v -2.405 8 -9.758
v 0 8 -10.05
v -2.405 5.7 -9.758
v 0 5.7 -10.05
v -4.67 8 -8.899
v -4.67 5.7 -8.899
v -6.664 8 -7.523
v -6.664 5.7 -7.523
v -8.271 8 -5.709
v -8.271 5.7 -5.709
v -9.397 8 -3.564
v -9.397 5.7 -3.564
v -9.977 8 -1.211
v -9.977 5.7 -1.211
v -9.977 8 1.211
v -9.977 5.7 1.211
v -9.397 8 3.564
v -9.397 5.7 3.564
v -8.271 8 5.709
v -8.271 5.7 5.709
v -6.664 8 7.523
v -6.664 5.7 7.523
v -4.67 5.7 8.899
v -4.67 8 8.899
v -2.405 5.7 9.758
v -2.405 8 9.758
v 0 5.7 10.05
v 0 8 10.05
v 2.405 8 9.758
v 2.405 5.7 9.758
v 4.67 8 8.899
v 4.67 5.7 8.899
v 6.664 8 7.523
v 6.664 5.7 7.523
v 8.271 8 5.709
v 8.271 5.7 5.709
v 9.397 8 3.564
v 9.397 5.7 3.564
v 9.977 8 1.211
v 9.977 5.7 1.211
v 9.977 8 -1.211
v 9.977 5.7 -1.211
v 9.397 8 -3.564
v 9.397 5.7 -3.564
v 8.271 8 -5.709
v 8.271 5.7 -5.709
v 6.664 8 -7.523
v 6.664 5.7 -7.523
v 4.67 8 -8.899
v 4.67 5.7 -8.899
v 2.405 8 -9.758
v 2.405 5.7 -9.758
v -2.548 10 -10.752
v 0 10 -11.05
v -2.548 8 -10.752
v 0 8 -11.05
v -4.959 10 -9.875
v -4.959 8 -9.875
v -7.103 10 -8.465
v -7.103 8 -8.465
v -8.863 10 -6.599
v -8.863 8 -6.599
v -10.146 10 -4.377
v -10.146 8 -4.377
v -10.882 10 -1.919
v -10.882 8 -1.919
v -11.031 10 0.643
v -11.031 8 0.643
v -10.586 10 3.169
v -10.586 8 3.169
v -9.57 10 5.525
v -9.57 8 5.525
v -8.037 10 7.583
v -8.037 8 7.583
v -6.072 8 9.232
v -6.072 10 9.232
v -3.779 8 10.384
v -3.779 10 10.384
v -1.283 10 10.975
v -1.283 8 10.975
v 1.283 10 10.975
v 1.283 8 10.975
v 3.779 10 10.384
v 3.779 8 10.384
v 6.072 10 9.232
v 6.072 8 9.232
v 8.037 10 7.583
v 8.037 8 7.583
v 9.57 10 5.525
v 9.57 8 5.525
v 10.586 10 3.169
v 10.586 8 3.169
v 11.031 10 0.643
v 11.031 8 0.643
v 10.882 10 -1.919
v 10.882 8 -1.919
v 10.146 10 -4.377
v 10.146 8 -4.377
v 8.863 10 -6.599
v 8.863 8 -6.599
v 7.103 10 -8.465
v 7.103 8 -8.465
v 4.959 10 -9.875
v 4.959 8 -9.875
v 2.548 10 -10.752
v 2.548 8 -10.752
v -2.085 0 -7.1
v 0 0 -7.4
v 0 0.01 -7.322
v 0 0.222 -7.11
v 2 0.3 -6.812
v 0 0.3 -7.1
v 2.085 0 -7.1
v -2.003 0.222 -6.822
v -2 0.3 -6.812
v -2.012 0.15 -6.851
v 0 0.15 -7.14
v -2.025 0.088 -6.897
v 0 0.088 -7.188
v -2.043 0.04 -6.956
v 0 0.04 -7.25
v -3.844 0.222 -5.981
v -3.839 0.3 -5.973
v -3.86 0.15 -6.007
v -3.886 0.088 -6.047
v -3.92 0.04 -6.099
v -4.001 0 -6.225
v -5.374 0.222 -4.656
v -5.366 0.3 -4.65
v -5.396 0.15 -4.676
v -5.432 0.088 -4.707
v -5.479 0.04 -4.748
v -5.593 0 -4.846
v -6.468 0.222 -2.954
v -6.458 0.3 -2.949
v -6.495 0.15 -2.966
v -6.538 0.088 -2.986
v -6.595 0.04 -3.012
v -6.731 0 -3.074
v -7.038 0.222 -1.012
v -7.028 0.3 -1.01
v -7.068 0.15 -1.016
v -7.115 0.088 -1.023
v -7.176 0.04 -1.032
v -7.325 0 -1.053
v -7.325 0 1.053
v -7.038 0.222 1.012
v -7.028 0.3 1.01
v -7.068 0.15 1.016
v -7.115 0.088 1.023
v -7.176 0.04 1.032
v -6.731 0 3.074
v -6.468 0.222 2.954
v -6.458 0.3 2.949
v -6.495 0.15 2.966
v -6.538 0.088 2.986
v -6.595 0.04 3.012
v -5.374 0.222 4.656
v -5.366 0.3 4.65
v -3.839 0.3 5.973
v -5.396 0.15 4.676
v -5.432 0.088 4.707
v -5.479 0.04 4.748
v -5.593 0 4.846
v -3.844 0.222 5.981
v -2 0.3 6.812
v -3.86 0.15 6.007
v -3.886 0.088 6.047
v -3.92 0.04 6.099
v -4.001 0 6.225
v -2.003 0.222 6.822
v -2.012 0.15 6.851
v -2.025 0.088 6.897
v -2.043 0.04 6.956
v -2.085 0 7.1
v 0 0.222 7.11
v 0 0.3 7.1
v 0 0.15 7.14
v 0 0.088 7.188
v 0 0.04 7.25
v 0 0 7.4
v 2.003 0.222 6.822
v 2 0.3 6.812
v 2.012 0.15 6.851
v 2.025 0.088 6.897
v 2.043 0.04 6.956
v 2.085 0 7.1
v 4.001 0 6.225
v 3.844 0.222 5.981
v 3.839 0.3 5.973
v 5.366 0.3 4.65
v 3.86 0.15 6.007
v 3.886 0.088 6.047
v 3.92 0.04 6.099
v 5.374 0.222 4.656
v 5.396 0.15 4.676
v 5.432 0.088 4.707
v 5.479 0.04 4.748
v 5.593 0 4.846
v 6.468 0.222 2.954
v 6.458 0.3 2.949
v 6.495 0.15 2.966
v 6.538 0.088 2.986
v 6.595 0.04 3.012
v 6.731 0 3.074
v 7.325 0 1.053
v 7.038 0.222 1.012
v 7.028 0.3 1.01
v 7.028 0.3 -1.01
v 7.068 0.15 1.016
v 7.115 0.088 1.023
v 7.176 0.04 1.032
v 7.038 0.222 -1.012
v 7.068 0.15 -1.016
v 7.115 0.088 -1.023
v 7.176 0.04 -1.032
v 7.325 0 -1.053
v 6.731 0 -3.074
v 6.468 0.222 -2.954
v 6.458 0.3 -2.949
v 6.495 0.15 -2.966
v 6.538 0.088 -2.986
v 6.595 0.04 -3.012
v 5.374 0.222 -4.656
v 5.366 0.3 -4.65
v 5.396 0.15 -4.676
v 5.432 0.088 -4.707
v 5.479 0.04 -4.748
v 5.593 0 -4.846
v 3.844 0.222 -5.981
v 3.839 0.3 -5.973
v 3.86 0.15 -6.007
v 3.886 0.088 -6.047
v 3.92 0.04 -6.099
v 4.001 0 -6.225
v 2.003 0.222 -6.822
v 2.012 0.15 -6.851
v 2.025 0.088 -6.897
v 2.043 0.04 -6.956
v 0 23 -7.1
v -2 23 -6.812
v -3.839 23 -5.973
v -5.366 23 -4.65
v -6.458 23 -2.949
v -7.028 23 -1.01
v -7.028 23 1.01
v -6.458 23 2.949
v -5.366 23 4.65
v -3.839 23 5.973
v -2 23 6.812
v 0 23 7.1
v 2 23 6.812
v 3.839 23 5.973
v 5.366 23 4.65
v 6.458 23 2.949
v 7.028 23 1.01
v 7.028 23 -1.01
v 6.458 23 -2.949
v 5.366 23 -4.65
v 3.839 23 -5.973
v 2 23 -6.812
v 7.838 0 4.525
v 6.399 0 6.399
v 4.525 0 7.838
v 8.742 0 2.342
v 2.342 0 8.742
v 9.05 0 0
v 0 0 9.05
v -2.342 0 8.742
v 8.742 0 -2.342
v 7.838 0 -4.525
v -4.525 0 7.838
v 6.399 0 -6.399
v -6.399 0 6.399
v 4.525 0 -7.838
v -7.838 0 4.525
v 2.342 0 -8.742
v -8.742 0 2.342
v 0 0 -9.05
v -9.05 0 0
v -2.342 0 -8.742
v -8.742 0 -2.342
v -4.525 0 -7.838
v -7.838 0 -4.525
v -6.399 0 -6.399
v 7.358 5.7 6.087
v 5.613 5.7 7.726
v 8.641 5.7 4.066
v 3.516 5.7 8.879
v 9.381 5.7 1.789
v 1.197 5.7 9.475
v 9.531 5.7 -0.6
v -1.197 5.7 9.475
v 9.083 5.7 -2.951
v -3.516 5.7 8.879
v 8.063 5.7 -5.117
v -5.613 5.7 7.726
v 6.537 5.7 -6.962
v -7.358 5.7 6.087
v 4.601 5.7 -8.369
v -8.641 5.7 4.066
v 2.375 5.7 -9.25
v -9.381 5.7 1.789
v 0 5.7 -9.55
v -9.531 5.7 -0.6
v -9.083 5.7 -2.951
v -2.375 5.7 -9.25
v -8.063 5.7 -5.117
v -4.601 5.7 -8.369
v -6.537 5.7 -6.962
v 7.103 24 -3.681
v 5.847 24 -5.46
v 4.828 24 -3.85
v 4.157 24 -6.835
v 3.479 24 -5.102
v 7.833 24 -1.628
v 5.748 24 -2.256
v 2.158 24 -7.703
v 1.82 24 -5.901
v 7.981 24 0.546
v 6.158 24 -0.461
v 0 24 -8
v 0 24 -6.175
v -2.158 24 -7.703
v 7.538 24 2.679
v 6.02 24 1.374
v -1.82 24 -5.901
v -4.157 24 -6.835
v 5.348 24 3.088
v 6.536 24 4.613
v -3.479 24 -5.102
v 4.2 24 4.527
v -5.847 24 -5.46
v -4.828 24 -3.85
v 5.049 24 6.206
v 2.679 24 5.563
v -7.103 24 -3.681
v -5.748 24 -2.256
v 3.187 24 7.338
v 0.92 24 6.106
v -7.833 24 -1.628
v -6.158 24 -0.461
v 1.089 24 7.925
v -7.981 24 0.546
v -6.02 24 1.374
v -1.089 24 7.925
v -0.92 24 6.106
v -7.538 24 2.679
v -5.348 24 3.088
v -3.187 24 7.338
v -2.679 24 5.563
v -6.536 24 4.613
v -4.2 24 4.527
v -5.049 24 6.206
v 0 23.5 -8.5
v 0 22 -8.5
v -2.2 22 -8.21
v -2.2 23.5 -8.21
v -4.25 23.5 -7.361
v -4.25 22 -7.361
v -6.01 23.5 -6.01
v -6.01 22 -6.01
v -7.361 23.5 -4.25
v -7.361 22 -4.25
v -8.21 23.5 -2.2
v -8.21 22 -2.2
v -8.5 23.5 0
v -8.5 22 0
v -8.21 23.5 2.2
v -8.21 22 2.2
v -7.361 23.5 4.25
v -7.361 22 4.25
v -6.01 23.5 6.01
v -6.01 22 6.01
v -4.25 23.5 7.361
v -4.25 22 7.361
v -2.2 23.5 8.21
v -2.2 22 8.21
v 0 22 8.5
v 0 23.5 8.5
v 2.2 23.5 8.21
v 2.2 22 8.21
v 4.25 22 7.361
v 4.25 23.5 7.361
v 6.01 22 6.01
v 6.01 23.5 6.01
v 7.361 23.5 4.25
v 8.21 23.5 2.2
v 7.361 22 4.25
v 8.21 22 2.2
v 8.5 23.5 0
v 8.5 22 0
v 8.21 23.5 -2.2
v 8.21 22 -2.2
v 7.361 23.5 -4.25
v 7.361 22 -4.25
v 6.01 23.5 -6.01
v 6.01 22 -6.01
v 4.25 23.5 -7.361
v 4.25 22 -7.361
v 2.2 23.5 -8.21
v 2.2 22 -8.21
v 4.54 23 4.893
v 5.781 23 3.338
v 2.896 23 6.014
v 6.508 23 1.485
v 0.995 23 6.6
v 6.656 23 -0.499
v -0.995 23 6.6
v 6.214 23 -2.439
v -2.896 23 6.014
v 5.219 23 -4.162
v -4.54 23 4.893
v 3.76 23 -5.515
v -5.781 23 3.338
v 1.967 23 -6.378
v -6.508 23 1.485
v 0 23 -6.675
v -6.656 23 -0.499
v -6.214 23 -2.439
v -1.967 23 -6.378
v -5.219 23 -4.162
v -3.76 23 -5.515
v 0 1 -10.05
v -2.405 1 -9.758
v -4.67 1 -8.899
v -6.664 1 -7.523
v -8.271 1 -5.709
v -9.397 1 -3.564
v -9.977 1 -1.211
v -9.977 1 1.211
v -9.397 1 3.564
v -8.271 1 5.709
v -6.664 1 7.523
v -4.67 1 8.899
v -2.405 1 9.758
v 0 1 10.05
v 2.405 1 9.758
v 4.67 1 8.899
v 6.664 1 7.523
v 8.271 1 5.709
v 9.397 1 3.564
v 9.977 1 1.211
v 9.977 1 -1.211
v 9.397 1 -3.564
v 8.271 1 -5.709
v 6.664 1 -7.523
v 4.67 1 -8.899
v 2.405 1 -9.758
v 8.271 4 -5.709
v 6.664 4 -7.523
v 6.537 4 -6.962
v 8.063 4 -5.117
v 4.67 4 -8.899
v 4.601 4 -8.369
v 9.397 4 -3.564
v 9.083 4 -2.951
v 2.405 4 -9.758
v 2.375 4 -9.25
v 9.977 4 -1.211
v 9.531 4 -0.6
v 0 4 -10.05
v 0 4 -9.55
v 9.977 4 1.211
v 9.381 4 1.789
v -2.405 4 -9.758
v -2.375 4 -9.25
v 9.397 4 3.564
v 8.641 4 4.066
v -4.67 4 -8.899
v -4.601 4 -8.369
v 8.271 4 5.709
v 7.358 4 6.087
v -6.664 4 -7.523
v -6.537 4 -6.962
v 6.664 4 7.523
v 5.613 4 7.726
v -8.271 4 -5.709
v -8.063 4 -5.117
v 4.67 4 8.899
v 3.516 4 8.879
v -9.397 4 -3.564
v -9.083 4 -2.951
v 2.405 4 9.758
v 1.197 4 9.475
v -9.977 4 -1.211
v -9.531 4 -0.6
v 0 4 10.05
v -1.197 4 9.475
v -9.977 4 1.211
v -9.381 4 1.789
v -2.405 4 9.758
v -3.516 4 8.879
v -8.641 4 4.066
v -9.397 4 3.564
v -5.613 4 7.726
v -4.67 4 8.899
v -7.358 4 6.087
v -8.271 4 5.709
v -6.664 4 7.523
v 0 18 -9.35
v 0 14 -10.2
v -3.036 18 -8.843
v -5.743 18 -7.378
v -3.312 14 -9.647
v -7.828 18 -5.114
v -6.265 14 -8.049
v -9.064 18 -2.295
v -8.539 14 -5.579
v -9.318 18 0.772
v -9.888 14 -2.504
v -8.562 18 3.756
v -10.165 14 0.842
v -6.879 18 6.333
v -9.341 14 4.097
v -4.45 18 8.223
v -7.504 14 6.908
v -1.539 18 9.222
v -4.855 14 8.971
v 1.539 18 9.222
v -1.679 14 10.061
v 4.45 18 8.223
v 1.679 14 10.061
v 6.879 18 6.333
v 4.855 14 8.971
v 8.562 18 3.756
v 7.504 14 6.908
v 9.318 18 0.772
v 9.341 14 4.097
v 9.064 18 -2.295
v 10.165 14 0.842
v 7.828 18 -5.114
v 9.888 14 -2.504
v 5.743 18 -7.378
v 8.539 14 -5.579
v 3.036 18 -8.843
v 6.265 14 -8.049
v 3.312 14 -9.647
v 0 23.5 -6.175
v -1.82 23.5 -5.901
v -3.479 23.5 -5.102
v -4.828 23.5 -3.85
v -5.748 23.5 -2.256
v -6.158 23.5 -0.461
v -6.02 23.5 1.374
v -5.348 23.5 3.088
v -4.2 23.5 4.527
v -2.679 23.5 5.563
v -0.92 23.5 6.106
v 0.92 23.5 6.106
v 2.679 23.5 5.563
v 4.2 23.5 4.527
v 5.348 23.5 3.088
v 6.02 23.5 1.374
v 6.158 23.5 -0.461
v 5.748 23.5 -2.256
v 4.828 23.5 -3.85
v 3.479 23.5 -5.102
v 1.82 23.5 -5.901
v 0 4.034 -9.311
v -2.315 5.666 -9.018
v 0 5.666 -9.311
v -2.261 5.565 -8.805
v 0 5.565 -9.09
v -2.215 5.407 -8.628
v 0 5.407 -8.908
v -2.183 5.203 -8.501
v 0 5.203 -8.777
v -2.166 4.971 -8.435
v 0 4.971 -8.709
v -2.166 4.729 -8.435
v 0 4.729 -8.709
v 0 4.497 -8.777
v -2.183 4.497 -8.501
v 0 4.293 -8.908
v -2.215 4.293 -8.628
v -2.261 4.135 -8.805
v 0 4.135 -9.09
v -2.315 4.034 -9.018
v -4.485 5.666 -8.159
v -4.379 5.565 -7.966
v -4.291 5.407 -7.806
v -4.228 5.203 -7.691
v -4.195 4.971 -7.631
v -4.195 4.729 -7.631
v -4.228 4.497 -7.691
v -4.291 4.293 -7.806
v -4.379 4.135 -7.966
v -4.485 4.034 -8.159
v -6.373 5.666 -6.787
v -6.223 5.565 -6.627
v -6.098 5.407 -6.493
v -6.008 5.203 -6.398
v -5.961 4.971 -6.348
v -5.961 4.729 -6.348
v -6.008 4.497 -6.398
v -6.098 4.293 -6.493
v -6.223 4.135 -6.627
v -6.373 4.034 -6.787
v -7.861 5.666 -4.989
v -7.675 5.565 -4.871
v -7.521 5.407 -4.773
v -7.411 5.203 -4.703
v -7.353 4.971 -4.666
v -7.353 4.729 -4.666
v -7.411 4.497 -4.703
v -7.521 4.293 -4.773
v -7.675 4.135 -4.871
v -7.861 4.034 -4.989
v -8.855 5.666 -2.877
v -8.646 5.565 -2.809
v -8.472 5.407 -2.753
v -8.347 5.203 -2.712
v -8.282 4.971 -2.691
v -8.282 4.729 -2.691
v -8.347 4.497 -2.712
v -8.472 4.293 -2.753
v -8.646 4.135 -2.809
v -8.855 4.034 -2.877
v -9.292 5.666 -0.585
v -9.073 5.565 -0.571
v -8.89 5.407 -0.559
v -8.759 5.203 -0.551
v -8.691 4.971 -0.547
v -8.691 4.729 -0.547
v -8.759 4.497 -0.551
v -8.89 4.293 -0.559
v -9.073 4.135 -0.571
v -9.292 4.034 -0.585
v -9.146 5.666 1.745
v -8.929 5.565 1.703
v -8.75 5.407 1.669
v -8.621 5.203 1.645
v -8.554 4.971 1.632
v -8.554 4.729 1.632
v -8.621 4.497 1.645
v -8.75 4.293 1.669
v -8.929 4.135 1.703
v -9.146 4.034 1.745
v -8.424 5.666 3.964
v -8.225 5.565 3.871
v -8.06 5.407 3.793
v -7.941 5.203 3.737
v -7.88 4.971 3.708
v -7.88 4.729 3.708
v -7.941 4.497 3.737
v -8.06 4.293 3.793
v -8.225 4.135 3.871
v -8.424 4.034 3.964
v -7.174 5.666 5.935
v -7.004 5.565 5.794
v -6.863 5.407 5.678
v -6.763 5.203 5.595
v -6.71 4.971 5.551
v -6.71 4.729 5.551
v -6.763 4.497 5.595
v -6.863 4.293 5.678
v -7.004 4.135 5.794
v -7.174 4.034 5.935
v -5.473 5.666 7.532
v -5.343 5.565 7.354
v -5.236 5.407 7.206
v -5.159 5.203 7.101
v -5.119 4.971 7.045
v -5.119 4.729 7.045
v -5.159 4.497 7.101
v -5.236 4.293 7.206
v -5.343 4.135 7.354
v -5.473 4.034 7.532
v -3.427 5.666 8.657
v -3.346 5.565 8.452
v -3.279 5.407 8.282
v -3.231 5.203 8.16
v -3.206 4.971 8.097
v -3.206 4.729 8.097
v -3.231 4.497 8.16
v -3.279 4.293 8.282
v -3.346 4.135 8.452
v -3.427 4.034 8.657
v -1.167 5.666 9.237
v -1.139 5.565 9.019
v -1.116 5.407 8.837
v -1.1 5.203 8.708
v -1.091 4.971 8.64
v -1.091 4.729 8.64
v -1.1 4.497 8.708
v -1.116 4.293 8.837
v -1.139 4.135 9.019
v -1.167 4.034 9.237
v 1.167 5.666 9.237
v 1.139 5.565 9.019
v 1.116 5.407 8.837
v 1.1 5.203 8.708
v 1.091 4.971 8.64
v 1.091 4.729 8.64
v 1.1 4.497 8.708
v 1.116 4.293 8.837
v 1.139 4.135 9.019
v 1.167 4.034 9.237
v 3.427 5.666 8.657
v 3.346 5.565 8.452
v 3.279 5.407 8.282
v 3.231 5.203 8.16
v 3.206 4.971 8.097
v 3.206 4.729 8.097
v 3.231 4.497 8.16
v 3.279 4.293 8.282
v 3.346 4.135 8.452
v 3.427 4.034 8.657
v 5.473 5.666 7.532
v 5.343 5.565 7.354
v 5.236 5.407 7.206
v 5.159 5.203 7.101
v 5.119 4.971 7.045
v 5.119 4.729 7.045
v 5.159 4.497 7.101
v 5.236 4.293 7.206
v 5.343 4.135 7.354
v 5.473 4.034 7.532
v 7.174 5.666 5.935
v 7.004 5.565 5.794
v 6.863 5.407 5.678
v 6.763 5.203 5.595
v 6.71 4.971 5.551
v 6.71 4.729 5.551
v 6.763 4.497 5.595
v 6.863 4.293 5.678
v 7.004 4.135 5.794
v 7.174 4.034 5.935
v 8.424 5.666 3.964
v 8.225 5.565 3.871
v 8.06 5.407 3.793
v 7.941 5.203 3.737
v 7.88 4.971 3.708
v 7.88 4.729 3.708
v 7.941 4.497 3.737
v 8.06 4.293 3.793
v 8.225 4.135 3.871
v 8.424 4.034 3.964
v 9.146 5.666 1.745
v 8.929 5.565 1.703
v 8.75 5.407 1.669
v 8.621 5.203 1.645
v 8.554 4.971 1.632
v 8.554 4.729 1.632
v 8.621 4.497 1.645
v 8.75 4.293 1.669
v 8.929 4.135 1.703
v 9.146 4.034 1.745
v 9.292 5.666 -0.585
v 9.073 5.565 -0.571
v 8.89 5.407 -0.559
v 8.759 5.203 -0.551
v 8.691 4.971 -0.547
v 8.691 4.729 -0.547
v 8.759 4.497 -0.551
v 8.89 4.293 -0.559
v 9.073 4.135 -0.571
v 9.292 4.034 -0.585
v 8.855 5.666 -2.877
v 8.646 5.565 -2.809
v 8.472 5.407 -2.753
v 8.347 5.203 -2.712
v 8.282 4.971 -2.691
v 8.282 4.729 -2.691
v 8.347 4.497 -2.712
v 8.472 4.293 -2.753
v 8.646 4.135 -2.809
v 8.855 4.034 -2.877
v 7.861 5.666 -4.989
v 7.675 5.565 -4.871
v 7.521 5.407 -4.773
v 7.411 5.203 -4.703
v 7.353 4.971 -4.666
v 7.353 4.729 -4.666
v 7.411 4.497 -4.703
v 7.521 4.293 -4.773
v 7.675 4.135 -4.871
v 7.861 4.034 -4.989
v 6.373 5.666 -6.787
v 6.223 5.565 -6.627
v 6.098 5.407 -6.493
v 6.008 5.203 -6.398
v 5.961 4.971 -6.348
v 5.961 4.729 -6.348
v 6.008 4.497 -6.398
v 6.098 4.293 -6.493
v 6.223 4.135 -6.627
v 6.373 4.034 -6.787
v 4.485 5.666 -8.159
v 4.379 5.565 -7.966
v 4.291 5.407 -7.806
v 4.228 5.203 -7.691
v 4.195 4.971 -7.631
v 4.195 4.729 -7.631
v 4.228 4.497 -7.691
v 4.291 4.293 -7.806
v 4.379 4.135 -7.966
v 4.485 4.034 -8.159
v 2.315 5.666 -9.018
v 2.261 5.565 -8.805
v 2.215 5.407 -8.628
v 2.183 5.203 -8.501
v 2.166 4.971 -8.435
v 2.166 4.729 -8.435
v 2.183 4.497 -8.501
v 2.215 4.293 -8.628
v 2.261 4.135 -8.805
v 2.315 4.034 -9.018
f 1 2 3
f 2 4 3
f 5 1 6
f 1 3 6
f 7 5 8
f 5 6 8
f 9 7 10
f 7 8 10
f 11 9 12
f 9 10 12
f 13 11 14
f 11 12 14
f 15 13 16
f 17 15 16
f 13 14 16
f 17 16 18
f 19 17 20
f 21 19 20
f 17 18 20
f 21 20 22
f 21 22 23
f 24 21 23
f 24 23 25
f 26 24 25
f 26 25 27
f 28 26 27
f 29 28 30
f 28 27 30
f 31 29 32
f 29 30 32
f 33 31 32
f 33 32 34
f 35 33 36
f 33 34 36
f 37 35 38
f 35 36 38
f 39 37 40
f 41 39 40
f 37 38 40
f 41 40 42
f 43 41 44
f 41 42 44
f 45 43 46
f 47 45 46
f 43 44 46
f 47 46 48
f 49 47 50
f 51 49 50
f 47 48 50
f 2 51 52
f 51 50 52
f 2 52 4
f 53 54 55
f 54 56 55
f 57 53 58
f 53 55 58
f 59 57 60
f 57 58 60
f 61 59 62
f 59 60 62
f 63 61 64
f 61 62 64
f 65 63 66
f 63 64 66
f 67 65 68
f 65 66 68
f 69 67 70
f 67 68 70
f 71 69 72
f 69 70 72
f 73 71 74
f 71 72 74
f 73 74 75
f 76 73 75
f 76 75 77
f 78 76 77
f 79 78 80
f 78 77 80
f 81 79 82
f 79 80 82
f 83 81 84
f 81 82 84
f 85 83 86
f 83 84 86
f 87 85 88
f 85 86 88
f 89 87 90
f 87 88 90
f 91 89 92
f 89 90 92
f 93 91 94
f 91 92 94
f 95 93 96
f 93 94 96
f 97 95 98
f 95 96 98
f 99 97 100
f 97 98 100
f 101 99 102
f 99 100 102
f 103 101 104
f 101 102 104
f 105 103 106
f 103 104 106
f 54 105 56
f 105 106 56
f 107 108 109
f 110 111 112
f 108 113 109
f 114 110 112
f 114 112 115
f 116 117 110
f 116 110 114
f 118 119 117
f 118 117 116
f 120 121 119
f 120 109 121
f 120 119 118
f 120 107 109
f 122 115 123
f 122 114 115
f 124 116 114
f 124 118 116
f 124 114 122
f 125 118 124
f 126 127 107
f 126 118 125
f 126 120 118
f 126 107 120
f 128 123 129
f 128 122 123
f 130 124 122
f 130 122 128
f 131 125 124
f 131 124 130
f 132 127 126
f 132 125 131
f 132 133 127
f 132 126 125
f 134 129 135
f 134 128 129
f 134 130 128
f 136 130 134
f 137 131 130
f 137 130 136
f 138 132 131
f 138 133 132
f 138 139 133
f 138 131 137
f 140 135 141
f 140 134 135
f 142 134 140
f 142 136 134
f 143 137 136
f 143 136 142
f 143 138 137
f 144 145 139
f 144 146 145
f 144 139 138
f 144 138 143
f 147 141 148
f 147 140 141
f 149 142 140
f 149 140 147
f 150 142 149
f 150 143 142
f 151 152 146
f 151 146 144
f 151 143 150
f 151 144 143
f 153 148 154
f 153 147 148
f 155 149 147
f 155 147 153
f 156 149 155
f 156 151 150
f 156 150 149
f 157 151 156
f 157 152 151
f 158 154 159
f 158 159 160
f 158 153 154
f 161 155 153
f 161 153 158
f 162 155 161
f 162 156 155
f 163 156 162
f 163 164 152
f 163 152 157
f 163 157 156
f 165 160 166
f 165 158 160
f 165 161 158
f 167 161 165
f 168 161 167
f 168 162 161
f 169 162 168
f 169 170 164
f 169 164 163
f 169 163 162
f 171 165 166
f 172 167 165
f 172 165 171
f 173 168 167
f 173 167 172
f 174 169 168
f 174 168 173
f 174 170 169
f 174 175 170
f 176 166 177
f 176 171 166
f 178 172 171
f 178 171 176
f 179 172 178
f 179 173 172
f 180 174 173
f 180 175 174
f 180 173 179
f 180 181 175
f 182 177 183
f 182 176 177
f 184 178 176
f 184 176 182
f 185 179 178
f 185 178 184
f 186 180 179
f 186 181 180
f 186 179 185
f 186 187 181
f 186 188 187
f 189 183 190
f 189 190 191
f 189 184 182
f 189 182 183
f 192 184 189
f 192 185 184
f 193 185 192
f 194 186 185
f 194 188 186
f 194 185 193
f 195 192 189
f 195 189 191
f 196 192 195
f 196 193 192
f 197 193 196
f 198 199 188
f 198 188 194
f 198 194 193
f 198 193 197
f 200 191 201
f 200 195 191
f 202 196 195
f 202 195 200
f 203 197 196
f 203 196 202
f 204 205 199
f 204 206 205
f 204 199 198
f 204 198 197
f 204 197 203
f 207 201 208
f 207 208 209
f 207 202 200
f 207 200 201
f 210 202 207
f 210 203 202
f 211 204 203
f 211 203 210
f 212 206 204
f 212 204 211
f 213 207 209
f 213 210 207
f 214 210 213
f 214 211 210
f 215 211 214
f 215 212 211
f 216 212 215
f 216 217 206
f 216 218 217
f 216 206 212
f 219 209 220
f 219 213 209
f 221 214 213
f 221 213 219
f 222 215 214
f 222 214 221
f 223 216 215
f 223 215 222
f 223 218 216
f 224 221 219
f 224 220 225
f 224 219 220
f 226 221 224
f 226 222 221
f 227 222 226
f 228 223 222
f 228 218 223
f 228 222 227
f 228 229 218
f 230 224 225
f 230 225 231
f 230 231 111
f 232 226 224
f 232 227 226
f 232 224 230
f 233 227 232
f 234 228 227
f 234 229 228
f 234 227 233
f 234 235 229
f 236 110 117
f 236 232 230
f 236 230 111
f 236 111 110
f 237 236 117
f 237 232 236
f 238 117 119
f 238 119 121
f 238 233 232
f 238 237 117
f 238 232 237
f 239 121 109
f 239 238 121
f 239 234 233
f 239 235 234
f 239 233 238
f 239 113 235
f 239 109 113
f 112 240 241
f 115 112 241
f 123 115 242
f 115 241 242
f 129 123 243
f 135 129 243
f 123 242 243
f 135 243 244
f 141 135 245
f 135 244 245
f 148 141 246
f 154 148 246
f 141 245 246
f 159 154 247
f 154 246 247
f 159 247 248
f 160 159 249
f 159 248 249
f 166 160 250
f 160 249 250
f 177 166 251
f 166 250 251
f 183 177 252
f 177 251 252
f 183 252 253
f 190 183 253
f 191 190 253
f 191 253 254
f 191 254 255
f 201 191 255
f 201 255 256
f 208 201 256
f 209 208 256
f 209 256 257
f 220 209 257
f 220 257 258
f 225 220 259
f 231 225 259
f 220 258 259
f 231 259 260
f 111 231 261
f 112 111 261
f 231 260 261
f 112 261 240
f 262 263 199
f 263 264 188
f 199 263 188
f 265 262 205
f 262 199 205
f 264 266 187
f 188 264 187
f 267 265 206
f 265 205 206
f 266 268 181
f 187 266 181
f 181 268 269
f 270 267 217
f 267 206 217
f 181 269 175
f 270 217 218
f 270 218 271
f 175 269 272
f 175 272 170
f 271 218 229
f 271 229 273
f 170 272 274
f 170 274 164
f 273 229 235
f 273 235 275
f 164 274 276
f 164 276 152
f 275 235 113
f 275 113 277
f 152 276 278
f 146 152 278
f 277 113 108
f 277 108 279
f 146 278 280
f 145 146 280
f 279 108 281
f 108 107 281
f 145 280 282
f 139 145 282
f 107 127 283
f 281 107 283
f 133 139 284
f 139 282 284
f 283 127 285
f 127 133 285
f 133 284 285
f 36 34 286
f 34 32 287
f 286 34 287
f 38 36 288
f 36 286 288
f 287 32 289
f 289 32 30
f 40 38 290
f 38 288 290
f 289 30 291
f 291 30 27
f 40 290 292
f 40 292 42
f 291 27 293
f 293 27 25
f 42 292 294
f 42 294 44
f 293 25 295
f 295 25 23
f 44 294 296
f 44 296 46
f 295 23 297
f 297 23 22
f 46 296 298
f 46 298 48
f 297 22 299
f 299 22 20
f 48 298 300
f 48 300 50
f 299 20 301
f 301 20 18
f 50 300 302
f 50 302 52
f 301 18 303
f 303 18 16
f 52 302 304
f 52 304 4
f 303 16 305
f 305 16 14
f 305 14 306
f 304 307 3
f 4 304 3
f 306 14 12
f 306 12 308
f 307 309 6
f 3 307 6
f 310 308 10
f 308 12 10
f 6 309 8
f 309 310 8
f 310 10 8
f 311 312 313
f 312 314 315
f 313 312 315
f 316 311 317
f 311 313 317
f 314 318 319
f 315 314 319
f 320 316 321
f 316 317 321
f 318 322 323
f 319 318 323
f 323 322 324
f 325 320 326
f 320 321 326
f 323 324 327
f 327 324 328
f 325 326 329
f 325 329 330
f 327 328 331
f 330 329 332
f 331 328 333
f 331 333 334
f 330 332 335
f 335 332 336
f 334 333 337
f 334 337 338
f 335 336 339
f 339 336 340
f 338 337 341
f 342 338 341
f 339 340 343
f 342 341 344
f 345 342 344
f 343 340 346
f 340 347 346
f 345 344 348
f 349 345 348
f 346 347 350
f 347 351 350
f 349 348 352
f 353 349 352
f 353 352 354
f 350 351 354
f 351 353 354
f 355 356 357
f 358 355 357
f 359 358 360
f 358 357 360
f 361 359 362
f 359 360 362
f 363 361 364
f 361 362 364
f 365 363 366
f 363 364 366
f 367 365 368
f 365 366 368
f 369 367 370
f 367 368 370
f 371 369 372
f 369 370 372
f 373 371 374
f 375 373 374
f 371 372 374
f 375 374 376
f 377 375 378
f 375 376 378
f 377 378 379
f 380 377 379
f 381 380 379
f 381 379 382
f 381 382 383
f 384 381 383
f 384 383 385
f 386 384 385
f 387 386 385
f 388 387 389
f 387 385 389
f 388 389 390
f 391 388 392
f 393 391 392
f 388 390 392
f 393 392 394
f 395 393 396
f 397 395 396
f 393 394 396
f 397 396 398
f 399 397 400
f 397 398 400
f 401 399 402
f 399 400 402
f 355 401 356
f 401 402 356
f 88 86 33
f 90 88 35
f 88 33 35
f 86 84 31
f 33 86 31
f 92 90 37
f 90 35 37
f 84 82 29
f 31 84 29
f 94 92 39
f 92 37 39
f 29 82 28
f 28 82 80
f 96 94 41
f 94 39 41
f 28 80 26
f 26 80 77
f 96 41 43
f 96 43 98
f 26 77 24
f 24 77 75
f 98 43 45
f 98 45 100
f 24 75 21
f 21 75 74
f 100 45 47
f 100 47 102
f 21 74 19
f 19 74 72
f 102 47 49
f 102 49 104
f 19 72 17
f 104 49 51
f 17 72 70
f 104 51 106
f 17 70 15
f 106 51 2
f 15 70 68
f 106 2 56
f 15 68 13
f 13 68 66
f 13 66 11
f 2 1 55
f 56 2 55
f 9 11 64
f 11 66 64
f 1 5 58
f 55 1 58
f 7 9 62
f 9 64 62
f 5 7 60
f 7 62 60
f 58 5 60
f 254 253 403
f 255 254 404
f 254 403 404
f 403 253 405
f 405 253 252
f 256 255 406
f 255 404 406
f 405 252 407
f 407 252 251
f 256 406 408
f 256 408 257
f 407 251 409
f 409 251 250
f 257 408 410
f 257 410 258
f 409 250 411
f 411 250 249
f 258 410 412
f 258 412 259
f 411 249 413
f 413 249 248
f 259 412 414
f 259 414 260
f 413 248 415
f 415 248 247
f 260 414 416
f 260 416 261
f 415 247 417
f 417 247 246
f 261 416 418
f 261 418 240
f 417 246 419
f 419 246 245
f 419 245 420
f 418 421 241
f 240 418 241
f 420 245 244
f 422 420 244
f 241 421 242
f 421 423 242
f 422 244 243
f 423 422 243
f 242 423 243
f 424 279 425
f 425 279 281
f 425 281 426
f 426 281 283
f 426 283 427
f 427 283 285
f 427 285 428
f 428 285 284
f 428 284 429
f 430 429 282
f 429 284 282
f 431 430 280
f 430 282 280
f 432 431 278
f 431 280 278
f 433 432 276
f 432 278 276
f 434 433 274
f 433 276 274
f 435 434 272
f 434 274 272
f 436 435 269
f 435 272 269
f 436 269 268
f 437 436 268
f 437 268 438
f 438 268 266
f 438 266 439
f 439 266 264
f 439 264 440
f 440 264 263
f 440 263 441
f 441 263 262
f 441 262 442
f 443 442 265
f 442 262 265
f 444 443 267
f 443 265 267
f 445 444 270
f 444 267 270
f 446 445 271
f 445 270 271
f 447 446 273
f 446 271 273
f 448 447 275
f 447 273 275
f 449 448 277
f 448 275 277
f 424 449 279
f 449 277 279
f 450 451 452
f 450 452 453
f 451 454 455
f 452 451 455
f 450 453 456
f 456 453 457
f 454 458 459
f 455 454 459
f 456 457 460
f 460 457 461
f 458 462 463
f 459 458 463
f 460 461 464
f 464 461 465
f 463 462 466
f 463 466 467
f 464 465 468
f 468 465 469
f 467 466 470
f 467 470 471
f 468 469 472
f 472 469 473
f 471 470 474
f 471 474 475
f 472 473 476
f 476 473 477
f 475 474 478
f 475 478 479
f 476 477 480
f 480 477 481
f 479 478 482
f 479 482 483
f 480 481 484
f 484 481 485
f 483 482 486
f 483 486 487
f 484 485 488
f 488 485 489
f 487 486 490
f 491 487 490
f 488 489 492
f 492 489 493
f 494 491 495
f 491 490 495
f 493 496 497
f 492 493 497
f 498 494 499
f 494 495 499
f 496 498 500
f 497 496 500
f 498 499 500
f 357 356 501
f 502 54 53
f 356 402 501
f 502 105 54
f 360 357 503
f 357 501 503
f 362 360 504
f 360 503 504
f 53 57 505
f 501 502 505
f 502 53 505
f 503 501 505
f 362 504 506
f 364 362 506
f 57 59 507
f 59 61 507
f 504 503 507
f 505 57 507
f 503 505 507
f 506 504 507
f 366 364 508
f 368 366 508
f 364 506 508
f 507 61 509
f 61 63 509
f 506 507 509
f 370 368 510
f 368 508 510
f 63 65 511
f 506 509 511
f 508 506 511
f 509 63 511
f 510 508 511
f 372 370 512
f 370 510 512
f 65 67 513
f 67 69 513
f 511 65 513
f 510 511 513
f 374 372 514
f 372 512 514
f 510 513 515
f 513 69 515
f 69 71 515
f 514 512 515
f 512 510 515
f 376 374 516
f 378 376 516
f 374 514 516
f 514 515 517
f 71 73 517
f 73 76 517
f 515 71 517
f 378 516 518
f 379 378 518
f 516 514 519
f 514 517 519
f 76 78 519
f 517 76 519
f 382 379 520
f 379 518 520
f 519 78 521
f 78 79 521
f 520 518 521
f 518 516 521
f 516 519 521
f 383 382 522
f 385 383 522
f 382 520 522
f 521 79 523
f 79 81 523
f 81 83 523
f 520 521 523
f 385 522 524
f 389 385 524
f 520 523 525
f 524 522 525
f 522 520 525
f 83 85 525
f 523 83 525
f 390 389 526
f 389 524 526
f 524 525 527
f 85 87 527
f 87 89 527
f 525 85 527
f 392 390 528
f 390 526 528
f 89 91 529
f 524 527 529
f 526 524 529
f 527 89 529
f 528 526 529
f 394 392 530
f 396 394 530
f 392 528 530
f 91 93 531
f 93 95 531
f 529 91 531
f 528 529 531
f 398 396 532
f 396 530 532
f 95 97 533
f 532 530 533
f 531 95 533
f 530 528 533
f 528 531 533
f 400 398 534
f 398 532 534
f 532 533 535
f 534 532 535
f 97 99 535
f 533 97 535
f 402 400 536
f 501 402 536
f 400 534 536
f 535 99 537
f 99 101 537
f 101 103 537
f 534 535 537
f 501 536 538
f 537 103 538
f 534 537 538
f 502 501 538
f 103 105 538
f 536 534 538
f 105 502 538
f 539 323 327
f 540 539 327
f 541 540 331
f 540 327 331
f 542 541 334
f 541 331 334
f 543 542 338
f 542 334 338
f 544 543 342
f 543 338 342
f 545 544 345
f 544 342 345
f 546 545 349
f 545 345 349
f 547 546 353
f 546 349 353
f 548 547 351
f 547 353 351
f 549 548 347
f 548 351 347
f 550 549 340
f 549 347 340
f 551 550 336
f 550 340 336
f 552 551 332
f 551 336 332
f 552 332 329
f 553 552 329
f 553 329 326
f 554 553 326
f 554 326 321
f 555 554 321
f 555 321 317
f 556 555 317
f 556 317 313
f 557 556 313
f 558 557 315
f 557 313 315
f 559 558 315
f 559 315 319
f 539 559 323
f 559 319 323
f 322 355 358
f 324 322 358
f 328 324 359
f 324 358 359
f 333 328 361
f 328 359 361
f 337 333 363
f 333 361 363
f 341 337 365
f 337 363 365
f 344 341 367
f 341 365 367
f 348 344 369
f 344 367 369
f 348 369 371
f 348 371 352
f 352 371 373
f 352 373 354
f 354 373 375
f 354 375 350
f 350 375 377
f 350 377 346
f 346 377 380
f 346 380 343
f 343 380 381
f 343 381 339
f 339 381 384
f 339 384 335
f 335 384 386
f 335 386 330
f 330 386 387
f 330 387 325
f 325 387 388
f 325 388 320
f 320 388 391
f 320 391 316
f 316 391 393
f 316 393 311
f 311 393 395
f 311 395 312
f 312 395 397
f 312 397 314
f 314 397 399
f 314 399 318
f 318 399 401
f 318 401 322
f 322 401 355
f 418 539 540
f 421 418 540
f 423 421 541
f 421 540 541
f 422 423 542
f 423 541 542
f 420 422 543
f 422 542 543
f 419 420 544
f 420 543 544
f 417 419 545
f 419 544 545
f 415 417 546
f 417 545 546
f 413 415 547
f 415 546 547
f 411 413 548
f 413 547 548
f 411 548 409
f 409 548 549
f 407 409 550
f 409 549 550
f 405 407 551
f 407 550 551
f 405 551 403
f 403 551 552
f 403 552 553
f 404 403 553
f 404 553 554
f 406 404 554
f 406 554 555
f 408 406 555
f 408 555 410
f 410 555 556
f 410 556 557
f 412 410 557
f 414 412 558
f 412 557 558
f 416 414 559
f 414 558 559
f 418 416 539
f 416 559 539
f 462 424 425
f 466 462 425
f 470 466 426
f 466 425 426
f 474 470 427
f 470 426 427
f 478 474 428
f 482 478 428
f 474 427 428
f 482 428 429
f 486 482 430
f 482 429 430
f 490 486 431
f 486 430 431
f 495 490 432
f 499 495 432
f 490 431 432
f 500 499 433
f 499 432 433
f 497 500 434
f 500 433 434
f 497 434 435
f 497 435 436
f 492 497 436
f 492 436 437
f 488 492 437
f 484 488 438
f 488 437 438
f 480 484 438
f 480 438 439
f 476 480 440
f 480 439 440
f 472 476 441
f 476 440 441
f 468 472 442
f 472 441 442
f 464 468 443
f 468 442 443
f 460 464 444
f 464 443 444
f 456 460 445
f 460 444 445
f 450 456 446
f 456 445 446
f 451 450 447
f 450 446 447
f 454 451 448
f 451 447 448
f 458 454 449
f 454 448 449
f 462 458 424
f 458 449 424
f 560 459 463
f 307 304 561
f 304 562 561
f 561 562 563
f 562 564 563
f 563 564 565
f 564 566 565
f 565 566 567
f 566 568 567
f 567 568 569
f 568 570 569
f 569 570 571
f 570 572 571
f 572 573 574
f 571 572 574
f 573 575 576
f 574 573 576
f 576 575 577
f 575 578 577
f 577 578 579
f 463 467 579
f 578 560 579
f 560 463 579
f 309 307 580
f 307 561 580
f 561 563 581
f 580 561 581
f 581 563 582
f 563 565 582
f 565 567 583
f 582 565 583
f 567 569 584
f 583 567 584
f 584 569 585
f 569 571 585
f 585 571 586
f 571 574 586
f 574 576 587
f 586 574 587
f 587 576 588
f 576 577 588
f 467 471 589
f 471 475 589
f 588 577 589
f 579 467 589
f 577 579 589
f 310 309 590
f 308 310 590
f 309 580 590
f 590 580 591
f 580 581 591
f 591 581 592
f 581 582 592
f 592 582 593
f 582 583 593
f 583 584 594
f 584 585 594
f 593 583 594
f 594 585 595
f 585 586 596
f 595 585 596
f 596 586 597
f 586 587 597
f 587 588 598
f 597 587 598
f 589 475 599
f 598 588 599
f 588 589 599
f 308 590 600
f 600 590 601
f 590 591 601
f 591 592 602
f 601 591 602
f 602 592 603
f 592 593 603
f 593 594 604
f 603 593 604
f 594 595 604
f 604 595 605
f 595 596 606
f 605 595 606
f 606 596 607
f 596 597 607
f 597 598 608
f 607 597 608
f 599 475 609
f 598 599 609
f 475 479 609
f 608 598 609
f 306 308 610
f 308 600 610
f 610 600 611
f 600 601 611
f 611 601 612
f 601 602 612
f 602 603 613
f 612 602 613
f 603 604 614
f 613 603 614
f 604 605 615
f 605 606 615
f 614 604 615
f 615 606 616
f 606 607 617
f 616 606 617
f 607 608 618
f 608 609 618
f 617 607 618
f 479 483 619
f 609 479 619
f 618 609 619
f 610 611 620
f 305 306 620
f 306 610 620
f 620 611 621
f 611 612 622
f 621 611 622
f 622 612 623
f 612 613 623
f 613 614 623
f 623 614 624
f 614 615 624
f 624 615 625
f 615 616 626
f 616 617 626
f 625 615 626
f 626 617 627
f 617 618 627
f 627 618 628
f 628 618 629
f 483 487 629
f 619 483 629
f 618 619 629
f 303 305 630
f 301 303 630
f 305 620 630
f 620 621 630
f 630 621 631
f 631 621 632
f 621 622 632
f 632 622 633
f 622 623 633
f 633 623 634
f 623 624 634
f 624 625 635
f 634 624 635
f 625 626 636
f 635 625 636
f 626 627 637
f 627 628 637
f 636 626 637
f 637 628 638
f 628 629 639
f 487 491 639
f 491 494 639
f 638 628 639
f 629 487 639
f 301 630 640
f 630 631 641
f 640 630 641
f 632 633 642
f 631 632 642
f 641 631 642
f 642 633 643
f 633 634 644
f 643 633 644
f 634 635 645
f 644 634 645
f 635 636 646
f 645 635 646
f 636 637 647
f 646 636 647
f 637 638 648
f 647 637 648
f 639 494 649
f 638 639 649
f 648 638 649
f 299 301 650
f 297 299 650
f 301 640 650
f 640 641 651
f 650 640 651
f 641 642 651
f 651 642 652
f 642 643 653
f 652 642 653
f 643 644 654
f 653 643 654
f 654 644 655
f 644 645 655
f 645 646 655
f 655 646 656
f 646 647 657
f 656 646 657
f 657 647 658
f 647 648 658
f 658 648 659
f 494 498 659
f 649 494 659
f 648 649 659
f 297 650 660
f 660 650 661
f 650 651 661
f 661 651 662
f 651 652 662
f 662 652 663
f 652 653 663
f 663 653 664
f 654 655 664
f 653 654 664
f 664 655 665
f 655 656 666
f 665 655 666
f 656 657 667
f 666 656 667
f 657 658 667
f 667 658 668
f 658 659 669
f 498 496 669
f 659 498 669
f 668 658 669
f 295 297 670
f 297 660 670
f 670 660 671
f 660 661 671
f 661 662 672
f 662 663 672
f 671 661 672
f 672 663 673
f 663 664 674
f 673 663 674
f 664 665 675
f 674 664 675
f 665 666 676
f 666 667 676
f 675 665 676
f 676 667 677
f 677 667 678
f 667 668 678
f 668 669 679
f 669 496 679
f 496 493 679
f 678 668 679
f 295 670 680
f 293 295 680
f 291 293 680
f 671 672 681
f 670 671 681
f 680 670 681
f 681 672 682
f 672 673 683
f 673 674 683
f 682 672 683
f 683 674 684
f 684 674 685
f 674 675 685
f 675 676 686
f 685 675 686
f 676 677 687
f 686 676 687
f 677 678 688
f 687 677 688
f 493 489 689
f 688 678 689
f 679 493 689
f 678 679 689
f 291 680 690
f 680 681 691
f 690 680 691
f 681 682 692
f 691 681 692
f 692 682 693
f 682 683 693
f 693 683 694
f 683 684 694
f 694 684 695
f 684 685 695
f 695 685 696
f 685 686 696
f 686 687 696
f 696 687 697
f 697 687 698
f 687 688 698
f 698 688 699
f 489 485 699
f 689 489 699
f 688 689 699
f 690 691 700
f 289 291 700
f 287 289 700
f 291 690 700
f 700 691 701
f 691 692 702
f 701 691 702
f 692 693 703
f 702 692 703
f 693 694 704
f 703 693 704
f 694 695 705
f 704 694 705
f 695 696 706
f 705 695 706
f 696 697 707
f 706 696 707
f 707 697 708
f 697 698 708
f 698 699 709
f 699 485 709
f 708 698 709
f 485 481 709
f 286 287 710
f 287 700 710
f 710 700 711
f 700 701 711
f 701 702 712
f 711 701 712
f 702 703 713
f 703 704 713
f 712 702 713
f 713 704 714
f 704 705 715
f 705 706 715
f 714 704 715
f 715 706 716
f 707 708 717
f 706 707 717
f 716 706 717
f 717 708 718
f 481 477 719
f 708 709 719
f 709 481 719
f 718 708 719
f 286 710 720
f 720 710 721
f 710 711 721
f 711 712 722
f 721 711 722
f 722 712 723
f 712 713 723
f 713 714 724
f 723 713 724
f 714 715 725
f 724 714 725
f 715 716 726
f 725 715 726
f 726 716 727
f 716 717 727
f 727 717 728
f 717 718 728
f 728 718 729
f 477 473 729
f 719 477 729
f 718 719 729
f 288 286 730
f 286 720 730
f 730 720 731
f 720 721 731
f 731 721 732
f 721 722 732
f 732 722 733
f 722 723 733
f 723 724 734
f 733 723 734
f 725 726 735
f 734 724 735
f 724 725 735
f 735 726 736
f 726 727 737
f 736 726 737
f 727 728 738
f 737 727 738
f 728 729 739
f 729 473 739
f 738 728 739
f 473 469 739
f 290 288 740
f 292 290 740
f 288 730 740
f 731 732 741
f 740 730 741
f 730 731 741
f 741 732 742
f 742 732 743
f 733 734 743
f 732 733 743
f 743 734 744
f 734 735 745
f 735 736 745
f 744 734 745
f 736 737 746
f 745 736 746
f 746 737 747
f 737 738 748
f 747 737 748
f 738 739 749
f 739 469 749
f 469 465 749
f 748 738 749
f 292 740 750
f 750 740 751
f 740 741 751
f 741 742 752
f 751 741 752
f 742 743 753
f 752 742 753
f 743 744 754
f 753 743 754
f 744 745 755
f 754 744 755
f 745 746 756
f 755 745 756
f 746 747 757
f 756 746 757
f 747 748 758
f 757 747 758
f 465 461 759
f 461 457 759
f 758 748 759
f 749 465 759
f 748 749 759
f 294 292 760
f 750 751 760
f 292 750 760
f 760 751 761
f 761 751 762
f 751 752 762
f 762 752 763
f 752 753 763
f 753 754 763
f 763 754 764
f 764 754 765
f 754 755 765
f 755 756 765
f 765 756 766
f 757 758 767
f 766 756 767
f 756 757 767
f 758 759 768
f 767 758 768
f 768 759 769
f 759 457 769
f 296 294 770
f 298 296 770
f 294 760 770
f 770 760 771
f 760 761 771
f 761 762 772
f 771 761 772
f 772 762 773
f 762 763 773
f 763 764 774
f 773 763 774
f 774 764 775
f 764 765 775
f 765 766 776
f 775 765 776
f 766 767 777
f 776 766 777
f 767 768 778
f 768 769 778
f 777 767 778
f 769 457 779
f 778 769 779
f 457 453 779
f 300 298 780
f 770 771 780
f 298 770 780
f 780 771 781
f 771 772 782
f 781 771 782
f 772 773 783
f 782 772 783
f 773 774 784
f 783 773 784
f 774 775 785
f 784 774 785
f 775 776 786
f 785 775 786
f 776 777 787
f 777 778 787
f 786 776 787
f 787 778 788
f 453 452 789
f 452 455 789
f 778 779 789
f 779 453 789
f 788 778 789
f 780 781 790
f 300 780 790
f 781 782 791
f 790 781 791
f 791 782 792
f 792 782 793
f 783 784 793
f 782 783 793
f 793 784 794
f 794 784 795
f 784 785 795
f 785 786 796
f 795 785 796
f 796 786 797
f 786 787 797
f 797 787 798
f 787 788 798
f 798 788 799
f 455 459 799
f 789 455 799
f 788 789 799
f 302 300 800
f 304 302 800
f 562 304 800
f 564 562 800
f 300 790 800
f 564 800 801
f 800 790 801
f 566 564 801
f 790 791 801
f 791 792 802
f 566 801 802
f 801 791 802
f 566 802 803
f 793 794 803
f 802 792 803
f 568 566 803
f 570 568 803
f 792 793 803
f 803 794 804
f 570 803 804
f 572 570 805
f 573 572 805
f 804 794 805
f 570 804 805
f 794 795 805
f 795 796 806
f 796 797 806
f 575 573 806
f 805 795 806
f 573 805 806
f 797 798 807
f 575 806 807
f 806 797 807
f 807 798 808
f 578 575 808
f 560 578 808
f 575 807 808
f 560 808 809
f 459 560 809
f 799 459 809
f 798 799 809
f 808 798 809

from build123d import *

# Parameters (mm, degrees)
CHAMFER_1_SIZE = 1
CHAMFER_2_SIZE = 0.5
FILLET_1_R     = 0.3
CHAMFER_3_SIZE = 0.5


with BuildPart() as part:
    # 스케치1 → 회전1 (revolve)
    with BuildSketch(Plane(origin=(0, 0, 0), x_dir=(0, 0, -1), z_dir=(1, 0, 0))):
        with BuildLine():
            Line((7.1, 0), (7.1, 23))
            Line((7.1, 23), (6.175, 23))
            Line((6.175, 23), (6.175, 24))
            Line((6.175, 24), (8.5, 24))
            Line((8.5, 24), (8.5, 22))
            Line((8.5, 22), (11.05, 10))
            Line((11.05, 10), (11.05, 8))
            Line((11.05, 8), (10.05, 8))
            Line((10.05, 8), (10.05, 5.7))
            Line((10.05, 5.7), (9.55, 5.7))
            ThreePointArc((9.55, 5.7), (8.7, 4.85), (9.55, 4))
            Line((9.55, 4), (10.05, 4))
            Line((10.05, 4), (10.05, 0))
            Line((10.05, 0), (7.1, 0))
        make_face()
    revolve(axis=Axis((0, 0, 0), (0, 1, 0)))

    # 모따기1
    chamfer_1_edges = [part.edges().sort_by_distance(p)[0] for p in [
        (0, 0, 10.05),
    ]]
    chamfer(chamfer_1_edges, length=CHAMFER_1_SIZE)

    # 모따기2
    chamfer_2_edges = [part.edges().sort_by_distance(p)[0] for p in [
        (0, 24, 8.5),
    ]]
    chamfer(chamfer_2_edges, length=CHAMFER_2_SIZE)

    # 필렛1
    fillet_1_edges = [part.edges().sort_by_distance(p)[0] for p in [
        (0, 0, 7.1),
    ]]
    fillet(fillet_1_edges, radius=FILLET_1_R)

    # 모따기3
    chamfer_3_edges = [part.edges().sort_by_distance(p)[0] for p in [
        (0, 23, 6.175),
    ]]
    chamfer(chamfer_3_edges, length=CHAMFER_3_SIZE)


solid = part.part
